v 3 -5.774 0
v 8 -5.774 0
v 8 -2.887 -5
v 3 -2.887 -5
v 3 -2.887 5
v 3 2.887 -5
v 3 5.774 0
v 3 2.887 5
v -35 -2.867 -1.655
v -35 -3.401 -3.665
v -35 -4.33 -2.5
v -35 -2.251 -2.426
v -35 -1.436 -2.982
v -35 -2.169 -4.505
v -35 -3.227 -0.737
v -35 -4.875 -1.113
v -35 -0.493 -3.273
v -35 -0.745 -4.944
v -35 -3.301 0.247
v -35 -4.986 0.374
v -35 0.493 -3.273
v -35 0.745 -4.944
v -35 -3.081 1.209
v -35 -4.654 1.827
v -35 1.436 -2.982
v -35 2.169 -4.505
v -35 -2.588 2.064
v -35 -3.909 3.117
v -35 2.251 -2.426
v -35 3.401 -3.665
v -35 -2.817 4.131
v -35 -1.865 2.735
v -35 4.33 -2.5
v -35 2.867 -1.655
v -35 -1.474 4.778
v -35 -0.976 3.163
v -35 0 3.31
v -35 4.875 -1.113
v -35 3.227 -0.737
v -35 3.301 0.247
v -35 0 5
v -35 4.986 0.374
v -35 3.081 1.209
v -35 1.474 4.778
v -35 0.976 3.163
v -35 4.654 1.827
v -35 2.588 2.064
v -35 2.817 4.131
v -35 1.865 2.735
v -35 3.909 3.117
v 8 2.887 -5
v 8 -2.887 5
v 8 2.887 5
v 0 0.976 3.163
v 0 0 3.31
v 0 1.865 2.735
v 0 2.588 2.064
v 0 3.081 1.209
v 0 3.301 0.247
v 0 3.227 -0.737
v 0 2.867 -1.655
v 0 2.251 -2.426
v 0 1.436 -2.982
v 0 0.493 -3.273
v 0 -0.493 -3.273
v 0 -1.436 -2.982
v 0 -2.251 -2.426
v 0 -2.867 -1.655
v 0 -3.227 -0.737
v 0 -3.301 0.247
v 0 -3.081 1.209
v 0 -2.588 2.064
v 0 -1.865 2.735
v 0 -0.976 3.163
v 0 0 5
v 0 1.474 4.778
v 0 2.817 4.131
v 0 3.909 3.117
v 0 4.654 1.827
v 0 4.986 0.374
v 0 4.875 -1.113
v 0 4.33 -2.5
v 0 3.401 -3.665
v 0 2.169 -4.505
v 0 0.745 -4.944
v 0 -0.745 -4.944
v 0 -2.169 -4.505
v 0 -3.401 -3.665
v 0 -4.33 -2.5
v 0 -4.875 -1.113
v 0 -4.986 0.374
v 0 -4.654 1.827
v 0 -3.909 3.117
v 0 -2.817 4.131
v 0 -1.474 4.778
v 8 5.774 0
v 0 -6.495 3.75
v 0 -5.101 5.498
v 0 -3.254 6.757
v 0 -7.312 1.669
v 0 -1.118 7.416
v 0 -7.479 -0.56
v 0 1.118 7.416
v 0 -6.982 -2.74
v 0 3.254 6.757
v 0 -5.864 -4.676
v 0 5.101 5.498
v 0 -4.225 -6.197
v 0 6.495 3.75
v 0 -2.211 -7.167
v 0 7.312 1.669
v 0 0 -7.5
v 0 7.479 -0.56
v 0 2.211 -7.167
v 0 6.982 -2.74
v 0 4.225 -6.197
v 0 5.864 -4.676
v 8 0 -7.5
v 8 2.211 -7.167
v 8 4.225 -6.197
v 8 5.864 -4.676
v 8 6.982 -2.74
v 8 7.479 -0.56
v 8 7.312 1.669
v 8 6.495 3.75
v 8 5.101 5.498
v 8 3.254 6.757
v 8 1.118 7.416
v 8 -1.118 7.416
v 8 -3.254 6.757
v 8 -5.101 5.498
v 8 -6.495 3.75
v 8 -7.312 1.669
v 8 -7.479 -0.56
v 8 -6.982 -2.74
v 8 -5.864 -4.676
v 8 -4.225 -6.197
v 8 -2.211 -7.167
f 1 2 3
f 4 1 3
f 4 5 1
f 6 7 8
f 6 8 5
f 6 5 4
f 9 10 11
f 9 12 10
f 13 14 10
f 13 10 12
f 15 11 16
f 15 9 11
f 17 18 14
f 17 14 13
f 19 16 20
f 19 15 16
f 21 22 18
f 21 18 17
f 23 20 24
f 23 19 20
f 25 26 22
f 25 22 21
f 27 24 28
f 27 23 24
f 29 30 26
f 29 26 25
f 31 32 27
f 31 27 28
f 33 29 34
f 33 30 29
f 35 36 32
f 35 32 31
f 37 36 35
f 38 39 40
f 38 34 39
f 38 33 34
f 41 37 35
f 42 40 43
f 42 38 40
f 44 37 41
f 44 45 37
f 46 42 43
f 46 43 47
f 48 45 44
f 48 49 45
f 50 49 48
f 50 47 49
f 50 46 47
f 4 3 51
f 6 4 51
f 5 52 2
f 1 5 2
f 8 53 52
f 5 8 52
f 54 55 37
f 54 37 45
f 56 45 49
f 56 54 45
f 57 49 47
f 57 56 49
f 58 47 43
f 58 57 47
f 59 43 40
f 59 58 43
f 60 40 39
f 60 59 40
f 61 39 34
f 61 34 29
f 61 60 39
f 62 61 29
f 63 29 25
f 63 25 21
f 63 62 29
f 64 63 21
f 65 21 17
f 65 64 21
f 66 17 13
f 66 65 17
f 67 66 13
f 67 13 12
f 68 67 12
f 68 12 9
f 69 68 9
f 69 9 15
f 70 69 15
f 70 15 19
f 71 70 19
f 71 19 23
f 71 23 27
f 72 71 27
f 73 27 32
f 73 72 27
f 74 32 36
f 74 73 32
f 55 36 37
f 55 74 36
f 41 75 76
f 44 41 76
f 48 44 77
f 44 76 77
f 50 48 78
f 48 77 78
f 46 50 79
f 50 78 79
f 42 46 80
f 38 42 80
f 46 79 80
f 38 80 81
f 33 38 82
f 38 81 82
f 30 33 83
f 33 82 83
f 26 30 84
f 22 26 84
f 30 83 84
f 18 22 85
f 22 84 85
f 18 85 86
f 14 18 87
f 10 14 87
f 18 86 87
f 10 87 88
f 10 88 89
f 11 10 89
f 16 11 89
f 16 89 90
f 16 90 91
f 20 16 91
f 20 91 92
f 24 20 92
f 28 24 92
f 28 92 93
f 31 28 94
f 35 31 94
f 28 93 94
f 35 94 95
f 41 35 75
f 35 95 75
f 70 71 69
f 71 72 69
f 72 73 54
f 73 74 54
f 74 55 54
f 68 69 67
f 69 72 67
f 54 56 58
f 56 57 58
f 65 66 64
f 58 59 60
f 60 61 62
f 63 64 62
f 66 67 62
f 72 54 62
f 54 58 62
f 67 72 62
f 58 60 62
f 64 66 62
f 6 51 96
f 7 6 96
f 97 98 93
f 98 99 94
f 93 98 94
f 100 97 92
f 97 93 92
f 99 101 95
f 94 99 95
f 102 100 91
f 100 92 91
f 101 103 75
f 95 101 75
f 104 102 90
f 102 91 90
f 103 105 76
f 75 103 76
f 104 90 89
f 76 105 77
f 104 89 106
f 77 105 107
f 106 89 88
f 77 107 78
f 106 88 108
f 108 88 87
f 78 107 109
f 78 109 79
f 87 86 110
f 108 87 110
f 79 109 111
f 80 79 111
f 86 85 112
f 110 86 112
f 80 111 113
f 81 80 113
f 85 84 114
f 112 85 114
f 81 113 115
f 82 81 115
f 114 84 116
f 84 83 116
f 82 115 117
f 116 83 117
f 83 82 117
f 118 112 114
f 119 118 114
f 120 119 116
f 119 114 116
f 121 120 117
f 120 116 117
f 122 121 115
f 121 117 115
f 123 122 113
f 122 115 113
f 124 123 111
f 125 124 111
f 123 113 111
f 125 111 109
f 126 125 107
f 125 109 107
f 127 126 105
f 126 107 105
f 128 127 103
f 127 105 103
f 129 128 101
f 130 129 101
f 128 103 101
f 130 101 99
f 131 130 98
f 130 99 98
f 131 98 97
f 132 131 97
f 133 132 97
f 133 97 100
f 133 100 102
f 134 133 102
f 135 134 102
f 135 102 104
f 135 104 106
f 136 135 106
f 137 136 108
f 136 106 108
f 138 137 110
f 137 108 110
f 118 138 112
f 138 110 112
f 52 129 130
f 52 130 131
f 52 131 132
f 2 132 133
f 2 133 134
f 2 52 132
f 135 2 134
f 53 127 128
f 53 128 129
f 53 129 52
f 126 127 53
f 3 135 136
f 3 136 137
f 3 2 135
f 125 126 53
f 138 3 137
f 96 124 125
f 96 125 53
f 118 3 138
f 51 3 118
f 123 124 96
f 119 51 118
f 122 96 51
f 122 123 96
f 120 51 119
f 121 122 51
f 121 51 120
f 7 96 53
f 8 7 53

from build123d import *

# Parameters (mm, degrees)
SKETCH1_R           = 7.5
BOSS_EXTRUDE1_DEPTH = 8
CUT_EXTRUDE1_DEPTH  = 5
SKETCH3_R           = 5
SKETCH3_R_2         = 3.31
EXTRUDE_THIN1_DEPTH = 35


with BuildPart() as part:
    # Sketch1 → Boss-Extrude1 (new body)
    with BuildSketch(Plane(origin=(0, 0, 0), x_dir=(0, 0, -1), z_dir=(1, 0, 0))):
        Circle(SKETCH1_R)
    extrude(amount=BOSS_EXTRUDE1_DEPTH)

    # Sketch2 → Cut-Extrude1 (cut)
    with BuildSketch(Plane(origin=(8, 0, 0), x_dir=(0, 0, -1), z_dir=(1, 0, 0))):
        Polygon((0, -5.773502692), (5, -2.886751346), (5, 2.886751346), (0, 5.773502692), (-5, 2.886751346), (-5, -2.886751346), align=None)
    extrude(amount=-CUT_EXTRUDE1_DEPTH, mode=Mode.SUBTRACT)

    # Sketch3 → Extrude-Thin1 (add)
    with BuildSketch(Plane.ZY):
        Circle(SKETCH3_R)
        Circle(SKETCH3_R_2, mode=Mode.SUBTRACT)
    extrude(amount=EXTRUDE_THIN1_DEPTH)


solid = part.part
